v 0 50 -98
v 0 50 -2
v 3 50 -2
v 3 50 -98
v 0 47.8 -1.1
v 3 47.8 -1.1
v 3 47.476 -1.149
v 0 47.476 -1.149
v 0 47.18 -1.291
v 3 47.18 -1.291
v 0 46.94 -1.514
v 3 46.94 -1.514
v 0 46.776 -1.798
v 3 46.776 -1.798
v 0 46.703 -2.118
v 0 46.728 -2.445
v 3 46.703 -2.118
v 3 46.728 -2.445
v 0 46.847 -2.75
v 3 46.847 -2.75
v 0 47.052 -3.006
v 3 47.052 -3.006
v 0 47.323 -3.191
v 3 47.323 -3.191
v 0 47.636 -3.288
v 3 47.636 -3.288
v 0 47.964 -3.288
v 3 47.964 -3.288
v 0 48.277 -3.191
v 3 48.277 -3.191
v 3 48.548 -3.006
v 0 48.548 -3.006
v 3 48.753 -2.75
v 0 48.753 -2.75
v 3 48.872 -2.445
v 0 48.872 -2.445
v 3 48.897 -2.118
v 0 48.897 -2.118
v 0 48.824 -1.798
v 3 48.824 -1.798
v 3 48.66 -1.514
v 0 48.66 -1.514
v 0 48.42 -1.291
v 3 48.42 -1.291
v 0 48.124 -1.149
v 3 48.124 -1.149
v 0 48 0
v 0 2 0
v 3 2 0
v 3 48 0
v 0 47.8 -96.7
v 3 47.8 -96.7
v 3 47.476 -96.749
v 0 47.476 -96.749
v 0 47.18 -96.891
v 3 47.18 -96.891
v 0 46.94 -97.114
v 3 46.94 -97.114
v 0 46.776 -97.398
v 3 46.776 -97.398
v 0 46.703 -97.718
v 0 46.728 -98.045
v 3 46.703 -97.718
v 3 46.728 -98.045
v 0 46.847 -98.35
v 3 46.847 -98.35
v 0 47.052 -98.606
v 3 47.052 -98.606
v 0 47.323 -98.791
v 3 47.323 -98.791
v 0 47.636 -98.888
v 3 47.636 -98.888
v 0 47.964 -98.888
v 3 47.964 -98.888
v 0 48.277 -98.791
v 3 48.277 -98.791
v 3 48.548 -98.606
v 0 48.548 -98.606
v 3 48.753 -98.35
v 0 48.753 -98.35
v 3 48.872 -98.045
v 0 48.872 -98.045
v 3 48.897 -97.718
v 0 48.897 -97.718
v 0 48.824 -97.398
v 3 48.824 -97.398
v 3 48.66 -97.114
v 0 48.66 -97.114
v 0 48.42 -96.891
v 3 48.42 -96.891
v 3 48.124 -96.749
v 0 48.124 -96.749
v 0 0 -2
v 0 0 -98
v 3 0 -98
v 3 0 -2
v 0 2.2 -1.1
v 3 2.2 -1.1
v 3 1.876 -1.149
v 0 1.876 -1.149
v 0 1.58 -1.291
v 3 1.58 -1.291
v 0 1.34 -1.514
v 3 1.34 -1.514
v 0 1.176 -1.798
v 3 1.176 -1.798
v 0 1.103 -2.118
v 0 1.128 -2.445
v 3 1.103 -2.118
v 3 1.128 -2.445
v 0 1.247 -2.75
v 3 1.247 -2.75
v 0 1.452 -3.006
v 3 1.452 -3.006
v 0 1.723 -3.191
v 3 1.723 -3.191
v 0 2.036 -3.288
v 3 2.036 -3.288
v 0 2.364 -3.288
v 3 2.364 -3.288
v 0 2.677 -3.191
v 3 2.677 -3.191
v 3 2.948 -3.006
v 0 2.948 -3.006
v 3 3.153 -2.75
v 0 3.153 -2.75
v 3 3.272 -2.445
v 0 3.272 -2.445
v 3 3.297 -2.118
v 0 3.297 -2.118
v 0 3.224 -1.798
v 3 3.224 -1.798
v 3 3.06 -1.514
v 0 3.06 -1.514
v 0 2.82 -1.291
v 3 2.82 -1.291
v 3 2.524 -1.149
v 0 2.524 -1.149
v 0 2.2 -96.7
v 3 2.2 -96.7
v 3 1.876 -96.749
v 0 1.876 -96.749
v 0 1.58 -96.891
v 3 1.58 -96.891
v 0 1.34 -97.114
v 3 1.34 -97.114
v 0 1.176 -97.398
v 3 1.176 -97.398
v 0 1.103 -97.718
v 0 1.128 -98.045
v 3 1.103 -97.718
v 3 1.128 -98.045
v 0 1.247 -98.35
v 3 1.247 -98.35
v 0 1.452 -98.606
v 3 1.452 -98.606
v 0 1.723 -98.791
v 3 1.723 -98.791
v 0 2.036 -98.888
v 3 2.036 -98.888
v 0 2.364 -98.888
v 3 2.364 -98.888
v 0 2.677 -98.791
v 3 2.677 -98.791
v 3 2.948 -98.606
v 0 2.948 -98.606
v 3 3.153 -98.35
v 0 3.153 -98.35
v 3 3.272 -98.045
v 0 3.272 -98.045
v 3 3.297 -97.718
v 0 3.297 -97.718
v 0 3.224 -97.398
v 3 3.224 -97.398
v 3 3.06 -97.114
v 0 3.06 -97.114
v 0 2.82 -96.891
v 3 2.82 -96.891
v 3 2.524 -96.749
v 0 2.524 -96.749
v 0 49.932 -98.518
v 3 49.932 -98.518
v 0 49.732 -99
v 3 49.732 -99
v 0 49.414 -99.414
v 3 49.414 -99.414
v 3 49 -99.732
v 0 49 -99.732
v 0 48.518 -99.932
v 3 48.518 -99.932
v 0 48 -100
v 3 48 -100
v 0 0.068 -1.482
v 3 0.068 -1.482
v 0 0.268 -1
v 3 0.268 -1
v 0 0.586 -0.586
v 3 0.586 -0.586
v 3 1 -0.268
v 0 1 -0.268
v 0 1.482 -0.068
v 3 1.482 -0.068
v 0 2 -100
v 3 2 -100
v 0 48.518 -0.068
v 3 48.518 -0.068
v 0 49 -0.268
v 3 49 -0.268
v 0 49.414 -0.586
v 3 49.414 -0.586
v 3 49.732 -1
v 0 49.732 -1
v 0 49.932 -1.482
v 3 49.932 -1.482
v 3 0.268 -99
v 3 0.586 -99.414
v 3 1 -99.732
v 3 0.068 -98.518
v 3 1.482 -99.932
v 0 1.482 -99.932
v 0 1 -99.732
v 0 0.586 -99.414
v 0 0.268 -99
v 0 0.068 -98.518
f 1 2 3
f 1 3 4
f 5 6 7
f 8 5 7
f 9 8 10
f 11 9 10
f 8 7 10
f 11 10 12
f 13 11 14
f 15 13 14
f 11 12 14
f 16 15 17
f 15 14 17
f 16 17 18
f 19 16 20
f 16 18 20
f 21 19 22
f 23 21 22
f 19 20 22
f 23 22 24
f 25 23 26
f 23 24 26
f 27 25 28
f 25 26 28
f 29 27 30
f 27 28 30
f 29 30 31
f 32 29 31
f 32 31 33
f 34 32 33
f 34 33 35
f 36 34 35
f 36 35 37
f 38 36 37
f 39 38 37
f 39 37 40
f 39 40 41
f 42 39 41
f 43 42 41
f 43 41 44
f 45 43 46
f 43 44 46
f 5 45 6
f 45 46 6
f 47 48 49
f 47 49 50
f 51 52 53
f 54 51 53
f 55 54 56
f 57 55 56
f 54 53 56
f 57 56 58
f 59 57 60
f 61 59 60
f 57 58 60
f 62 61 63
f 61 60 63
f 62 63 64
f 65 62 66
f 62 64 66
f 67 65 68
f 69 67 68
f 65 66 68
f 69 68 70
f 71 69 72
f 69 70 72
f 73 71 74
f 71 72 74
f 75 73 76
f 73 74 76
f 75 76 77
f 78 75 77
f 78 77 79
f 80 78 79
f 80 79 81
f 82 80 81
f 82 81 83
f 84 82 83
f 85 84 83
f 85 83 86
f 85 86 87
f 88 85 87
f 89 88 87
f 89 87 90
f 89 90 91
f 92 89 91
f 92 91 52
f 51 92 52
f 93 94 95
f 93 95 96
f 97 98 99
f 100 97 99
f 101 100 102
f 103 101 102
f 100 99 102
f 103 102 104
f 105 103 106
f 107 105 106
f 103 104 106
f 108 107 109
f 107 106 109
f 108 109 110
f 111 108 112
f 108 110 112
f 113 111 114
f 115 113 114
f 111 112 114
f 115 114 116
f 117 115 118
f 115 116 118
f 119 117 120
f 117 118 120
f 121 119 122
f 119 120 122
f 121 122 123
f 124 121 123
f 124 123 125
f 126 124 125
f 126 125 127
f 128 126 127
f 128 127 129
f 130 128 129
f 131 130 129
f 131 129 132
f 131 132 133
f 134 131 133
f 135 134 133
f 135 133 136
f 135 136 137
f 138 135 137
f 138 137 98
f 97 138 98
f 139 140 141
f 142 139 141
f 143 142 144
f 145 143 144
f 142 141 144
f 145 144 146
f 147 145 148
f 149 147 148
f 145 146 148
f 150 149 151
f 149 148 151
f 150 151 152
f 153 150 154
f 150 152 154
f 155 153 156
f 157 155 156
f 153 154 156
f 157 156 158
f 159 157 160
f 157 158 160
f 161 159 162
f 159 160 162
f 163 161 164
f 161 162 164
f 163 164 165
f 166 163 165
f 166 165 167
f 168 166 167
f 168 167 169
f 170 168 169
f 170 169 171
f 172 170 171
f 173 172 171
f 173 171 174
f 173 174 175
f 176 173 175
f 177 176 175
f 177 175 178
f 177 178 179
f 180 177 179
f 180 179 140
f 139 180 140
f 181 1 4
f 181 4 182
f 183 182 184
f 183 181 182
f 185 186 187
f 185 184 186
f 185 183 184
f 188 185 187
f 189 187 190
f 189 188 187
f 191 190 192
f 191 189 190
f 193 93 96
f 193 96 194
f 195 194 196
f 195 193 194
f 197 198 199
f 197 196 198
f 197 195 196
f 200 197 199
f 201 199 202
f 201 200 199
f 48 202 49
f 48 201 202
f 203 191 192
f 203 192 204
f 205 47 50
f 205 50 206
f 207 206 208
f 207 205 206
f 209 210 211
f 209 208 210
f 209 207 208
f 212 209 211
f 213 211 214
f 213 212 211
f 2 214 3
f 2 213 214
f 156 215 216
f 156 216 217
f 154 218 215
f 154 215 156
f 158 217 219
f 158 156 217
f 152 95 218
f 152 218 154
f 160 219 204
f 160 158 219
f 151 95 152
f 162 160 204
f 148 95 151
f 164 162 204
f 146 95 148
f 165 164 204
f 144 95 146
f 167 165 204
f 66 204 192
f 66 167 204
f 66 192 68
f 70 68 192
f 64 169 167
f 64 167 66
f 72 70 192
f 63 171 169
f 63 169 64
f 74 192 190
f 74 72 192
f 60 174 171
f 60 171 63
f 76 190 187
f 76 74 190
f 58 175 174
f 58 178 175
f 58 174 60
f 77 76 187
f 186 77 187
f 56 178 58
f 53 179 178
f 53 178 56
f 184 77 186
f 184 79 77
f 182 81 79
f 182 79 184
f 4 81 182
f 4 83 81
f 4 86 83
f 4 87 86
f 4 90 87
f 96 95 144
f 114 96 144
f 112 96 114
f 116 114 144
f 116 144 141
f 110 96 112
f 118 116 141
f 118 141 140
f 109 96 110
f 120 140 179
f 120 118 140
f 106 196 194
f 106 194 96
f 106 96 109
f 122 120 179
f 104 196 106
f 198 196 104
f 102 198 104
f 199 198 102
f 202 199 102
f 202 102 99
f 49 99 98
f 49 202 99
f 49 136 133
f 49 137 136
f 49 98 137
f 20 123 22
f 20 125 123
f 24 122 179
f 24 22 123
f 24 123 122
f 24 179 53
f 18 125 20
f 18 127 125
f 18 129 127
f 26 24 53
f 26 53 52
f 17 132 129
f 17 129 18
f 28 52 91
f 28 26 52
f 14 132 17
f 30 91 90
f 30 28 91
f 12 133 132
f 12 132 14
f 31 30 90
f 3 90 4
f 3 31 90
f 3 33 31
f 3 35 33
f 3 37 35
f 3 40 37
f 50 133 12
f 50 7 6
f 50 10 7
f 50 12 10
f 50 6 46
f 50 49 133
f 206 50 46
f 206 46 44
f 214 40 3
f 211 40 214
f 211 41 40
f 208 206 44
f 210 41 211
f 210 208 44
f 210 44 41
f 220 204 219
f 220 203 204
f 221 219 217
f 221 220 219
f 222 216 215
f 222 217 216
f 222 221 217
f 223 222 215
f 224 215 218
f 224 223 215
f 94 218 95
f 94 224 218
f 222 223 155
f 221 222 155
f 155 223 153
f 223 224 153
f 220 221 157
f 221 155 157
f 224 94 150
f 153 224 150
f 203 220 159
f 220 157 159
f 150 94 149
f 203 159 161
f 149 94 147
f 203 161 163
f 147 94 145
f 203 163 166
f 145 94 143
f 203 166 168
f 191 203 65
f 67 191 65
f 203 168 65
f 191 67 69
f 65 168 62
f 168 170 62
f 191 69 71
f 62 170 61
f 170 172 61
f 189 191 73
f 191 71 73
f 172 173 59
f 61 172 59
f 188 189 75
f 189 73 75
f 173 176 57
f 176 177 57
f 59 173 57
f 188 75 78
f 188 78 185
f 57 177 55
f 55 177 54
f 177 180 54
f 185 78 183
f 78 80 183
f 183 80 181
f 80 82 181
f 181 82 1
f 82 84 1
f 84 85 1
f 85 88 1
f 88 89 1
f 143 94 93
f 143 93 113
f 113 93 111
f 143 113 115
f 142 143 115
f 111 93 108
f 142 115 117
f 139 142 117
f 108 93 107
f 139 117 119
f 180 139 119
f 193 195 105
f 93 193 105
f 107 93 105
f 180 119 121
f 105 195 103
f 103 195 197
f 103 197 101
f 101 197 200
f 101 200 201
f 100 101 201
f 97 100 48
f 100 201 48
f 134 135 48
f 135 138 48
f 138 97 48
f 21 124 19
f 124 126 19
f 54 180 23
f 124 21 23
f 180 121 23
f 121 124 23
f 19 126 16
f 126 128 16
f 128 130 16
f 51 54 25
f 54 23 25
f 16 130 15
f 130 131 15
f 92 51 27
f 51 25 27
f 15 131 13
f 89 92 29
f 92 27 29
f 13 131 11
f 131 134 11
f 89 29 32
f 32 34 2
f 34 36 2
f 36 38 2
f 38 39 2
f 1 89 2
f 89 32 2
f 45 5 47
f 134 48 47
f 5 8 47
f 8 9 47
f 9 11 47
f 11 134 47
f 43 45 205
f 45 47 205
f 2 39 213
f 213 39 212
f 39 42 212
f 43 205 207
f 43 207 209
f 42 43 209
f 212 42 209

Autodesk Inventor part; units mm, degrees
ref_plane "YZ Plane" through (0, 0, 0) normal (1, 0, 0) x (0, 1, 0)
ref_plane "XZ Plane" through (0, 0, 0) normal (0, 1, 0) x (-1, 0, 0)
ref_plane "XY Plane" through (0, 0, 0) normal (0, 0, 1) x (1, 0, 0)
sketch "Sketch1" plane through (0, 0, 0) normal (1, 0, 0) x (0, 1, 0)
  line L0 (2, 0) -> (48, 0)
  line L1 (50, -2) -> (50, -98)
  line L2 (48, -100) -> (2, -100)
  line L3 (0, -98) -> (0, -2)
  arc A0 (50, -2) -> (48, 0) centre (48, -2) ccw
  arc A1 (0, -98) -> (2, -100) centre (2, -98) ccw
  arc A2 (48, -100) -> (50, -98) centre (48, -98) ccw
  arc A3 (2, 0) -> (0, -2) centre (2, -2) ccw
  circle A4 centre (47.8, -2.2) radius 1.1
  line L4 (50, -50) -> (19.7358, -50) construction
  line L5 (25, 0) -> (25, -33.4431) construction
  circle A5 centre (47.8, -97.8) radius 1.1
  circle A6 centre (2.2, -2.2) radius 1.1
  circle A7 centre (2.2, -97.8) radius 1.1
  point P0 (0, 0)
  point P1 (50, -100)
  point P2 (50, 0)
  point P3 (0, -100)
  point P4 (2, -2)
  point P5 (2, -98)
  dimension "d0" = 50
  dimension "d1" = 100
  dimension "d2" = 2
  dimension "d3" = 2.2
  dimension "d4" = 2.2
  dimension "d5" = 2.2
extrude "Extrusion1" add sketch "Sketch1" along normal blind 3 contours L0 A0 L1 A2 L2 A1 L3 A3 | A4 | A5 | A6 | A7
hole "Hole1" at (0, 47.8, -2.2) at (0, 2.2, -2.2) at (0, 47.8, -97.8) at (0, 2.2, -97.8) direction (1, 0, 0) diameter 2.2 depth 6.3 tip angle 118 clearance for "Countersunk Flat Head Screw ISO 2009/7046" size "M2" standard "ISO"
properties part number "ściana tylna"
